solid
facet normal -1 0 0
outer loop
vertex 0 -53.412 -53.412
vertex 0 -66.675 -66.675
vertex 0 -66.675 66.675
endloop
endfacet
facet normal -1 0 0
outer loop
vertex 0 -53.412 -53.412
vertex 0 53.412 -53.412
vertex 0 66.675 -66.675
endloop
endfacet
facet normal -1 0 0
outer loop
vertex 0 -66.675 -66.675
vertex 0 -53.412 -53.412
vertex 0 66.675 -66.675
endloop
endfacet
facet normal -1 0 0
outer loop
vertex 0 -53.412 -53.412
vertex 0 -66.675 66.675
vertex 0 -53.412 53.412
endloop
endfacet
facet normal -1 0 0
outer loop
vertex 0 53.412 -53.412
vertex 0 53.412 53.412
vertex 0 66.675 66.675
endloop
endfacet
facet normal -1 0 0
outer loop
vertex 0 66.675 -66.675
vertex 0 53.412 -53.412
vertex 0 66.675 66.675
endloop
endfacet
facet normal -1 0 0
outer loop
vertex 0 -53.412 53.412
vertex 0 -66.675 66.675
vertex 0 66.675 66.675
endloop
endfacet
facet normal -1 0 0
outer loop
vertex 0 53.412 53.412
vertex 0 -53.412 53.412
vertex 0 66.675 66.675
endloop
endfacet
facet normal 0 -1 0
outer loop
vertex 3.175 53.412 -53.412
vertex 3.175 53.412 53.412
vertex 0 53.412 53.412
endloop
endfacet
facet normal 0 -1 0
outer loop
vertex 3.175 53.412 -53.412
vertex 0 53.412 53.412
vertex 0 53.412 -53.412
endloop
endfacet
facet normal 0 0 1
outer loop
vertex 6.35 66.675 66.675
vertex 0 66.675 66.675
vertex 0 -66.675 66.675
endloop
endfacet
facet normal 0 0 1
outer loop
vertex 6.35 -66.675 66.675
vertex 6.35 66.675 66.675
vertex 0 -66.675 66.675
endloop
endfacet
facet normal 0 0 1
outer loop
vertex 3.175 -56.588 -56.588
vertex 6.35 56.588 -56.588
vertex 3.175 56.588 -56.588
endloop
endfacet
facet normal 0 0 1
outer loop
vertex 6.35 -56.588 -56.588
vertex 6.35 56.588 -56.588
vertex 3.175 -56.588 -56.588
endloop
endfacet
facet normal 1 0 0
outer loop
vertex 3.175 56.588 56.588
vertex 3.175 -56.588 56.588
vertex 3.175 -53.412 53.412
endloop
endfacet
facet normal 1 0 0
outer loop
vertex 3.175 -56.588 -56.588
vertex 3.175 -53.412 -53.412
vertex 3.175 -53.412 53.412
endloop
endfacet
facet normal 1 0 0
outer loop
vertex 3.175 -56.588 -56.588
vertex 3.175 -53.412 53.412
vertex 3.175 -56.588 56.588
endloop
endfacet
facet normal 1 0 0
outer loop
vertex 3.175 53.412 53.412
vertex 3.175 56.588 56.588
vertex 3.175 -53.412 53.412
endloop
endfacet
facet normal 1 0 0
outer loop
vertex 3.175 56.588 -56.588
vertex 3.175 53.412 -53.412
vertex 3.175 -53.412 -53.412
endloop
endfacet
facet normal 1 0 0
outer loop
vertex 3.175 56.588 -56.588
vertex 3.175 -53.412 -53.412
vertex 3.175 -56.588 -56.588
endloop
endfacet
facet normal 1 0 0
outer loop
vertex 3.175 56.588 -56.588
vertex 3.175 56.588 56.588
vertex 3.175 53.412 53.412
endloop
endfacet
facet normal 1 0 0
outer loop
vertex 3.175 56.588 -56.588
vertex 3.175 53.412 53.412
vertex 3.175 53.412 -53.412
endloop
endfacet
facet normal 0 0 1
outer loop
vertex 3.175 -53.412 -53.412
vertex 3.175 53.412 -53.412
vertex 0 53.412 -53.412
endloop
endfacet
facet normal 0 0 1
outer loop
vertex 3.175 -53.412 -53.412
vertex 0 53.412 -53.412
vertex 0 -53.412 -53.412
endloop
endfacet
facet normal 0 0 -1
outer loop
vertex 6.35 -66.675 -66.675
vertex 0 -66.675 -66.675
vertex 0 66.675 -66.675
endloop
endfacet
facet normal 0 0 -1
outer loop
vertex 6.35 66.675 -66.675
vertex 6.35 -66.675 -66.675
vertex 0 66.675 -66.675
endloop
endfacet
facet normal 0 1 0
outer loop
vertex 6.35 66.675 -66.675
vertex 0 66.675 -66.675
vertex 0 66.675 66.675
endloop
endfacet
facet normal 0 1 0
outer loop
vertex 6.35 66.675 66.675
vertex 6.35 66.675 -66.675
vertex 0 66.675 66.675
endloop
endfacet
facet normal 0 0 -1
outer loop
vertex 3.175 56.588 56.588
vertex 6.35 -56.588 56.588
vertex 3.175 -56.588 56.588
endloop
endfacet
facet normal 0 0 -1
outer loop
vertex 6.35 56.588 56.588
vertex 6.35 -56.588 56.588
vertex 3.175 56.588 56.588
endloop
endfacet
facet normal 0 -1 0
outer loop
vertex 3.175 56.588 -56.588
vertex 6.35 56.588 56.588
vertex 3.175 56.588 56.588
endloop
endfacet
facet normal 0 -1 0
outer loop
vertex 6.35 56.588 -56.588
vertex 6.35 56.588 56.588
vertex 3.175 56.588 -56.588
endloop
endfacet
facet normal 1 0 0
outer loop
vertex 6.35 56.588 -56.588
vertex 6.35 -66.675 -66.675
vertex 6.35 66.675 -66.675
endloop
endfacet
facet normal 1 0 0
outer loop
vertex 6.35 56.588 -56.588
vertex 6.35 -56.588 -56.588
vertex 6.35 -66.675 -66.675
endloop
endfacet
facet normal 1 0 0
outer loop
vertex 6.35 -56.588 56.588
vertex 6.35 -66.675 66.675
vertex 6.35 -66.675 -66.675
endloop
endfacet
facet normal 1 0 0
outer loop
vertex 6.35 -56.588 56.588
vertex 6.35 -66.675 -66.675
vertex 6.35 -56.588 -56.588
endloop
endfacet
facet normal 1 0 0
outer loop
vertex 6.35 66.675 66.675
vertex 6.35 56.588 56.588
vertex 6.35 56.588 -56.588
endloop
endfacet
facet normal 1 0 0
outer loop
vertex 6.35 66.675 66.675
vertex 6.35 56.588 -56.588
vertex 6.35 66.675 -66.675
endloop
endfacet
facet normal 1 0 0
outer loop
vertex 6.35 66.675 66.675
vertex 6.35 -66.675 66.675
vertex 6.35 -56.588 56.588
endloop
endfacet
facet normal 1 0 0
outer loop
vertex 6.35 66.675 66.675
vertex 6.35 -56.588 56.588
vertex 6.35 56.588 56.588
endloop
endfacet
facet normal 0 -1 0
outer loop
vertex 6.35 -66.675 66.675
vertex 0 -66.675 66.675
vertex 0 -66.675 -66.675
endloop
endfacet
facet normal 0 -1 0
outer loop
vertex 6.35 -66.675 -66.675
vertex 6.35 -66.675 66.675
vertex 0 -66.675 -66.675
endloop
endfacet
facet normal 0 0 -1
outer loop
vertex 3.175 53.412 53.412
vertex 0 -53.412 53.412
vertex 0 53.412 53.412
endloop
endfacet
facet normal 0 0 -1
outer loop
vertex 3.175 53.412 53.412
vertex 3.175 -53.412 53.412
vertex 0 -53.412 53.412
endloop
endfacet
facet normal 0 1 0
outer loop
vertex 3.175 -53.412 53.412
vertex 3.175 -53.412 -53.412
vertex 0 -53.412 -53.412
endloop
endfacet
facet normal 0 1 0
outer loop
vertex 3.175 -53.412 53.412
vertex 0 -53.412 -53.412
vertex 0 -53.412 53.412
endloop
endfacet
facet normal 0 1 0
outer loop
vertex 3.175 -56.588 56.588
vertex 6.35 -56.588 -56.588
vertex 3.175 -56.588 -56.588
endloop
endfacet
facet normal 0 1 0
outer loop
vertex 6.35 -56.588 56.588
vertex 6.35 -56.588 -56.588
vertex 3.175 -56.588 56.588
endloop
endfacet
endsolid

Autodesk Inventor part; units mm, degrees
ref_plane "YZ Plane" through (0, 0, 0) normal (1, 0, 0) x (0, 1, 0)
ref_plane "XZ Plane" through (0, 0, 0) normal (0, 1, 0) x (-1, 0, 0)
ref_plane "XY Plane" through (0, 0, 0) normal (0, 0, 1) x (1, 0, 0)
sketch "Sketch1" plane through (0, 0, 0) normal (1, 0, 0) x (0, 1, 0)
  line L0 (-66.675, -66.675) -> (66.675, -66.675)
  line L1 (66.675, -66.675) -> (66.675, 66.675)
  line L2 (66.675, 66.675) -> (-66.675, 66.675)
  line L3 (-66.675, 66.675) -> (-66.675, -66.675)
  line L4 (-66.675, -66.675) -> (66.675, 66.675) construction
  line L5 (66.675, -66.675) -> (-66.675, 66.675) construction
  point P0 (0, 0)
  dimension "d0" = 133.35
  dimension "d1" = 133.35
extrude "Extrusion1" add sketch "Sketch1" along normal blind 6.35
sketch "Sketch2" plane through (6.35, 0, 0) normal (1, 0, 0) x (0, 0, -1)
  line L0 (56.5875, -56.5875) -> (-56.5875, -56.5875)
  line L1 (-56.5875, -56.5875) -> (-56.5875, 56.5875)
  line L2 (-56.5875, 56.5875) -> (56.5875, 56.5875)
  line L3 (56.5875, 56.5875) -> (56.5875, -56.5875)
  line L4 (56.5875, -56.5875) -> (-56.5875, 56.5875) construction
  line L5 (-56.5875, -56.5875) -> (56.5875, 56.5875) construction
  point P0 (0, 0)
  dimension "d4" = 113.175
  dimension "d5" = 113.175
extrude "Extrusion2" cut sketch "Sketch2" against normal blind 3.175
sketch "Sketch3" plane through (3.175, 0, 0) normal (1, 0, 0) x (0, 0, -1)
  line L0 (56.5875, -56.5875) -> (-56.5875, -56.5875) projected
  line L1 (56.5875, 56.5875) -> (56.5875, -56.5875) projected
  line L2 (-56.5875, 56.5875) -> (56.5875, 56.5875) projected
  line L3 (-56.5875, -56.5875) -> (-56.5875, 56.5875) projected
  line L4 (-53.4125, 53.4125) -> (53.4125, 53.4125)
  line L5 (53.4125, 53.4125) -> (53.4125, -53.4125)
  line L6 (53.4125, -53.4125) -> (-53.4125, -53.4125)
  line L7 (-53.4125, -53.4125) -> (-53.4125, 53.4125)
  point P0 (0, 0)
  dimension "d8" = 3.175
extrude "Extrusion3" cut sketch "Sketch3" against normal through all contours L4 L5 L6 L7
equation "\"d0\" = width + internalAcrylicThickness"
equation "\"d1\" = height + internalAcrylicThickness"
equation "\"d2\" = internalAcrylicThickness"
equation "\"d4\" = aerogelHeight + aerogelClearence"
equation "\"d5\" = aerogelWidth + aerogelClearence"
equation "\"d6\" = 0.5 * internalAcrylicThickness"
equation "\"d8\" = aerogelClearence"
equation "\"d9\" = 0.5 * internalAcrylicThickness"
equation "\"frameAcrylicThickness\" = 9.525"
equation "\"internalAcrylicThickness\" = 6.35"
equation "\"aerogelWidth\" = 110"
equation "\"aerogelHeight\" = 110"
equation "\"height\" = 127"
equation "\"width\" = 127"
equation "\"depth\" = 273.05"
equation "\"mirrorAngle\" = 5deg"
equation "\"detectorWidth\" = 52"
equation "\"detectorHeight\" = 52"
equation "\"mirrorThickness\" = 3.175"
equation "\"fresnelThickness\" = 0.1"
equation "\"focalLength\" = 76.2"
equation "\"ior\" = 1.49"
equation "\"centerThickness\" = 1.524"
equation "\"fresnelAngle\" = 90deg"
equation "\"fresnelEffectiveDiameter\" = 152.4"
equation "\"oRingWidth\" = 1.5875"
equation "\"sensorHolderDepth\" = 19.05"
equation "\"aerogelClearence\" = 3.175"
equation "\"backplanePostionOffsett\" = 12.7"
equation "\"backplaneHoleOffsett\" = 6.35"
equation "\"backplanePCBHeight\" = 76.2"
equation "\"backplanePCBWidth\" = 76.2"
equation "\"moduleSlotClearence\" = 0.79375"
properties part number "aerogelHolder" material "ABS Plastic"
